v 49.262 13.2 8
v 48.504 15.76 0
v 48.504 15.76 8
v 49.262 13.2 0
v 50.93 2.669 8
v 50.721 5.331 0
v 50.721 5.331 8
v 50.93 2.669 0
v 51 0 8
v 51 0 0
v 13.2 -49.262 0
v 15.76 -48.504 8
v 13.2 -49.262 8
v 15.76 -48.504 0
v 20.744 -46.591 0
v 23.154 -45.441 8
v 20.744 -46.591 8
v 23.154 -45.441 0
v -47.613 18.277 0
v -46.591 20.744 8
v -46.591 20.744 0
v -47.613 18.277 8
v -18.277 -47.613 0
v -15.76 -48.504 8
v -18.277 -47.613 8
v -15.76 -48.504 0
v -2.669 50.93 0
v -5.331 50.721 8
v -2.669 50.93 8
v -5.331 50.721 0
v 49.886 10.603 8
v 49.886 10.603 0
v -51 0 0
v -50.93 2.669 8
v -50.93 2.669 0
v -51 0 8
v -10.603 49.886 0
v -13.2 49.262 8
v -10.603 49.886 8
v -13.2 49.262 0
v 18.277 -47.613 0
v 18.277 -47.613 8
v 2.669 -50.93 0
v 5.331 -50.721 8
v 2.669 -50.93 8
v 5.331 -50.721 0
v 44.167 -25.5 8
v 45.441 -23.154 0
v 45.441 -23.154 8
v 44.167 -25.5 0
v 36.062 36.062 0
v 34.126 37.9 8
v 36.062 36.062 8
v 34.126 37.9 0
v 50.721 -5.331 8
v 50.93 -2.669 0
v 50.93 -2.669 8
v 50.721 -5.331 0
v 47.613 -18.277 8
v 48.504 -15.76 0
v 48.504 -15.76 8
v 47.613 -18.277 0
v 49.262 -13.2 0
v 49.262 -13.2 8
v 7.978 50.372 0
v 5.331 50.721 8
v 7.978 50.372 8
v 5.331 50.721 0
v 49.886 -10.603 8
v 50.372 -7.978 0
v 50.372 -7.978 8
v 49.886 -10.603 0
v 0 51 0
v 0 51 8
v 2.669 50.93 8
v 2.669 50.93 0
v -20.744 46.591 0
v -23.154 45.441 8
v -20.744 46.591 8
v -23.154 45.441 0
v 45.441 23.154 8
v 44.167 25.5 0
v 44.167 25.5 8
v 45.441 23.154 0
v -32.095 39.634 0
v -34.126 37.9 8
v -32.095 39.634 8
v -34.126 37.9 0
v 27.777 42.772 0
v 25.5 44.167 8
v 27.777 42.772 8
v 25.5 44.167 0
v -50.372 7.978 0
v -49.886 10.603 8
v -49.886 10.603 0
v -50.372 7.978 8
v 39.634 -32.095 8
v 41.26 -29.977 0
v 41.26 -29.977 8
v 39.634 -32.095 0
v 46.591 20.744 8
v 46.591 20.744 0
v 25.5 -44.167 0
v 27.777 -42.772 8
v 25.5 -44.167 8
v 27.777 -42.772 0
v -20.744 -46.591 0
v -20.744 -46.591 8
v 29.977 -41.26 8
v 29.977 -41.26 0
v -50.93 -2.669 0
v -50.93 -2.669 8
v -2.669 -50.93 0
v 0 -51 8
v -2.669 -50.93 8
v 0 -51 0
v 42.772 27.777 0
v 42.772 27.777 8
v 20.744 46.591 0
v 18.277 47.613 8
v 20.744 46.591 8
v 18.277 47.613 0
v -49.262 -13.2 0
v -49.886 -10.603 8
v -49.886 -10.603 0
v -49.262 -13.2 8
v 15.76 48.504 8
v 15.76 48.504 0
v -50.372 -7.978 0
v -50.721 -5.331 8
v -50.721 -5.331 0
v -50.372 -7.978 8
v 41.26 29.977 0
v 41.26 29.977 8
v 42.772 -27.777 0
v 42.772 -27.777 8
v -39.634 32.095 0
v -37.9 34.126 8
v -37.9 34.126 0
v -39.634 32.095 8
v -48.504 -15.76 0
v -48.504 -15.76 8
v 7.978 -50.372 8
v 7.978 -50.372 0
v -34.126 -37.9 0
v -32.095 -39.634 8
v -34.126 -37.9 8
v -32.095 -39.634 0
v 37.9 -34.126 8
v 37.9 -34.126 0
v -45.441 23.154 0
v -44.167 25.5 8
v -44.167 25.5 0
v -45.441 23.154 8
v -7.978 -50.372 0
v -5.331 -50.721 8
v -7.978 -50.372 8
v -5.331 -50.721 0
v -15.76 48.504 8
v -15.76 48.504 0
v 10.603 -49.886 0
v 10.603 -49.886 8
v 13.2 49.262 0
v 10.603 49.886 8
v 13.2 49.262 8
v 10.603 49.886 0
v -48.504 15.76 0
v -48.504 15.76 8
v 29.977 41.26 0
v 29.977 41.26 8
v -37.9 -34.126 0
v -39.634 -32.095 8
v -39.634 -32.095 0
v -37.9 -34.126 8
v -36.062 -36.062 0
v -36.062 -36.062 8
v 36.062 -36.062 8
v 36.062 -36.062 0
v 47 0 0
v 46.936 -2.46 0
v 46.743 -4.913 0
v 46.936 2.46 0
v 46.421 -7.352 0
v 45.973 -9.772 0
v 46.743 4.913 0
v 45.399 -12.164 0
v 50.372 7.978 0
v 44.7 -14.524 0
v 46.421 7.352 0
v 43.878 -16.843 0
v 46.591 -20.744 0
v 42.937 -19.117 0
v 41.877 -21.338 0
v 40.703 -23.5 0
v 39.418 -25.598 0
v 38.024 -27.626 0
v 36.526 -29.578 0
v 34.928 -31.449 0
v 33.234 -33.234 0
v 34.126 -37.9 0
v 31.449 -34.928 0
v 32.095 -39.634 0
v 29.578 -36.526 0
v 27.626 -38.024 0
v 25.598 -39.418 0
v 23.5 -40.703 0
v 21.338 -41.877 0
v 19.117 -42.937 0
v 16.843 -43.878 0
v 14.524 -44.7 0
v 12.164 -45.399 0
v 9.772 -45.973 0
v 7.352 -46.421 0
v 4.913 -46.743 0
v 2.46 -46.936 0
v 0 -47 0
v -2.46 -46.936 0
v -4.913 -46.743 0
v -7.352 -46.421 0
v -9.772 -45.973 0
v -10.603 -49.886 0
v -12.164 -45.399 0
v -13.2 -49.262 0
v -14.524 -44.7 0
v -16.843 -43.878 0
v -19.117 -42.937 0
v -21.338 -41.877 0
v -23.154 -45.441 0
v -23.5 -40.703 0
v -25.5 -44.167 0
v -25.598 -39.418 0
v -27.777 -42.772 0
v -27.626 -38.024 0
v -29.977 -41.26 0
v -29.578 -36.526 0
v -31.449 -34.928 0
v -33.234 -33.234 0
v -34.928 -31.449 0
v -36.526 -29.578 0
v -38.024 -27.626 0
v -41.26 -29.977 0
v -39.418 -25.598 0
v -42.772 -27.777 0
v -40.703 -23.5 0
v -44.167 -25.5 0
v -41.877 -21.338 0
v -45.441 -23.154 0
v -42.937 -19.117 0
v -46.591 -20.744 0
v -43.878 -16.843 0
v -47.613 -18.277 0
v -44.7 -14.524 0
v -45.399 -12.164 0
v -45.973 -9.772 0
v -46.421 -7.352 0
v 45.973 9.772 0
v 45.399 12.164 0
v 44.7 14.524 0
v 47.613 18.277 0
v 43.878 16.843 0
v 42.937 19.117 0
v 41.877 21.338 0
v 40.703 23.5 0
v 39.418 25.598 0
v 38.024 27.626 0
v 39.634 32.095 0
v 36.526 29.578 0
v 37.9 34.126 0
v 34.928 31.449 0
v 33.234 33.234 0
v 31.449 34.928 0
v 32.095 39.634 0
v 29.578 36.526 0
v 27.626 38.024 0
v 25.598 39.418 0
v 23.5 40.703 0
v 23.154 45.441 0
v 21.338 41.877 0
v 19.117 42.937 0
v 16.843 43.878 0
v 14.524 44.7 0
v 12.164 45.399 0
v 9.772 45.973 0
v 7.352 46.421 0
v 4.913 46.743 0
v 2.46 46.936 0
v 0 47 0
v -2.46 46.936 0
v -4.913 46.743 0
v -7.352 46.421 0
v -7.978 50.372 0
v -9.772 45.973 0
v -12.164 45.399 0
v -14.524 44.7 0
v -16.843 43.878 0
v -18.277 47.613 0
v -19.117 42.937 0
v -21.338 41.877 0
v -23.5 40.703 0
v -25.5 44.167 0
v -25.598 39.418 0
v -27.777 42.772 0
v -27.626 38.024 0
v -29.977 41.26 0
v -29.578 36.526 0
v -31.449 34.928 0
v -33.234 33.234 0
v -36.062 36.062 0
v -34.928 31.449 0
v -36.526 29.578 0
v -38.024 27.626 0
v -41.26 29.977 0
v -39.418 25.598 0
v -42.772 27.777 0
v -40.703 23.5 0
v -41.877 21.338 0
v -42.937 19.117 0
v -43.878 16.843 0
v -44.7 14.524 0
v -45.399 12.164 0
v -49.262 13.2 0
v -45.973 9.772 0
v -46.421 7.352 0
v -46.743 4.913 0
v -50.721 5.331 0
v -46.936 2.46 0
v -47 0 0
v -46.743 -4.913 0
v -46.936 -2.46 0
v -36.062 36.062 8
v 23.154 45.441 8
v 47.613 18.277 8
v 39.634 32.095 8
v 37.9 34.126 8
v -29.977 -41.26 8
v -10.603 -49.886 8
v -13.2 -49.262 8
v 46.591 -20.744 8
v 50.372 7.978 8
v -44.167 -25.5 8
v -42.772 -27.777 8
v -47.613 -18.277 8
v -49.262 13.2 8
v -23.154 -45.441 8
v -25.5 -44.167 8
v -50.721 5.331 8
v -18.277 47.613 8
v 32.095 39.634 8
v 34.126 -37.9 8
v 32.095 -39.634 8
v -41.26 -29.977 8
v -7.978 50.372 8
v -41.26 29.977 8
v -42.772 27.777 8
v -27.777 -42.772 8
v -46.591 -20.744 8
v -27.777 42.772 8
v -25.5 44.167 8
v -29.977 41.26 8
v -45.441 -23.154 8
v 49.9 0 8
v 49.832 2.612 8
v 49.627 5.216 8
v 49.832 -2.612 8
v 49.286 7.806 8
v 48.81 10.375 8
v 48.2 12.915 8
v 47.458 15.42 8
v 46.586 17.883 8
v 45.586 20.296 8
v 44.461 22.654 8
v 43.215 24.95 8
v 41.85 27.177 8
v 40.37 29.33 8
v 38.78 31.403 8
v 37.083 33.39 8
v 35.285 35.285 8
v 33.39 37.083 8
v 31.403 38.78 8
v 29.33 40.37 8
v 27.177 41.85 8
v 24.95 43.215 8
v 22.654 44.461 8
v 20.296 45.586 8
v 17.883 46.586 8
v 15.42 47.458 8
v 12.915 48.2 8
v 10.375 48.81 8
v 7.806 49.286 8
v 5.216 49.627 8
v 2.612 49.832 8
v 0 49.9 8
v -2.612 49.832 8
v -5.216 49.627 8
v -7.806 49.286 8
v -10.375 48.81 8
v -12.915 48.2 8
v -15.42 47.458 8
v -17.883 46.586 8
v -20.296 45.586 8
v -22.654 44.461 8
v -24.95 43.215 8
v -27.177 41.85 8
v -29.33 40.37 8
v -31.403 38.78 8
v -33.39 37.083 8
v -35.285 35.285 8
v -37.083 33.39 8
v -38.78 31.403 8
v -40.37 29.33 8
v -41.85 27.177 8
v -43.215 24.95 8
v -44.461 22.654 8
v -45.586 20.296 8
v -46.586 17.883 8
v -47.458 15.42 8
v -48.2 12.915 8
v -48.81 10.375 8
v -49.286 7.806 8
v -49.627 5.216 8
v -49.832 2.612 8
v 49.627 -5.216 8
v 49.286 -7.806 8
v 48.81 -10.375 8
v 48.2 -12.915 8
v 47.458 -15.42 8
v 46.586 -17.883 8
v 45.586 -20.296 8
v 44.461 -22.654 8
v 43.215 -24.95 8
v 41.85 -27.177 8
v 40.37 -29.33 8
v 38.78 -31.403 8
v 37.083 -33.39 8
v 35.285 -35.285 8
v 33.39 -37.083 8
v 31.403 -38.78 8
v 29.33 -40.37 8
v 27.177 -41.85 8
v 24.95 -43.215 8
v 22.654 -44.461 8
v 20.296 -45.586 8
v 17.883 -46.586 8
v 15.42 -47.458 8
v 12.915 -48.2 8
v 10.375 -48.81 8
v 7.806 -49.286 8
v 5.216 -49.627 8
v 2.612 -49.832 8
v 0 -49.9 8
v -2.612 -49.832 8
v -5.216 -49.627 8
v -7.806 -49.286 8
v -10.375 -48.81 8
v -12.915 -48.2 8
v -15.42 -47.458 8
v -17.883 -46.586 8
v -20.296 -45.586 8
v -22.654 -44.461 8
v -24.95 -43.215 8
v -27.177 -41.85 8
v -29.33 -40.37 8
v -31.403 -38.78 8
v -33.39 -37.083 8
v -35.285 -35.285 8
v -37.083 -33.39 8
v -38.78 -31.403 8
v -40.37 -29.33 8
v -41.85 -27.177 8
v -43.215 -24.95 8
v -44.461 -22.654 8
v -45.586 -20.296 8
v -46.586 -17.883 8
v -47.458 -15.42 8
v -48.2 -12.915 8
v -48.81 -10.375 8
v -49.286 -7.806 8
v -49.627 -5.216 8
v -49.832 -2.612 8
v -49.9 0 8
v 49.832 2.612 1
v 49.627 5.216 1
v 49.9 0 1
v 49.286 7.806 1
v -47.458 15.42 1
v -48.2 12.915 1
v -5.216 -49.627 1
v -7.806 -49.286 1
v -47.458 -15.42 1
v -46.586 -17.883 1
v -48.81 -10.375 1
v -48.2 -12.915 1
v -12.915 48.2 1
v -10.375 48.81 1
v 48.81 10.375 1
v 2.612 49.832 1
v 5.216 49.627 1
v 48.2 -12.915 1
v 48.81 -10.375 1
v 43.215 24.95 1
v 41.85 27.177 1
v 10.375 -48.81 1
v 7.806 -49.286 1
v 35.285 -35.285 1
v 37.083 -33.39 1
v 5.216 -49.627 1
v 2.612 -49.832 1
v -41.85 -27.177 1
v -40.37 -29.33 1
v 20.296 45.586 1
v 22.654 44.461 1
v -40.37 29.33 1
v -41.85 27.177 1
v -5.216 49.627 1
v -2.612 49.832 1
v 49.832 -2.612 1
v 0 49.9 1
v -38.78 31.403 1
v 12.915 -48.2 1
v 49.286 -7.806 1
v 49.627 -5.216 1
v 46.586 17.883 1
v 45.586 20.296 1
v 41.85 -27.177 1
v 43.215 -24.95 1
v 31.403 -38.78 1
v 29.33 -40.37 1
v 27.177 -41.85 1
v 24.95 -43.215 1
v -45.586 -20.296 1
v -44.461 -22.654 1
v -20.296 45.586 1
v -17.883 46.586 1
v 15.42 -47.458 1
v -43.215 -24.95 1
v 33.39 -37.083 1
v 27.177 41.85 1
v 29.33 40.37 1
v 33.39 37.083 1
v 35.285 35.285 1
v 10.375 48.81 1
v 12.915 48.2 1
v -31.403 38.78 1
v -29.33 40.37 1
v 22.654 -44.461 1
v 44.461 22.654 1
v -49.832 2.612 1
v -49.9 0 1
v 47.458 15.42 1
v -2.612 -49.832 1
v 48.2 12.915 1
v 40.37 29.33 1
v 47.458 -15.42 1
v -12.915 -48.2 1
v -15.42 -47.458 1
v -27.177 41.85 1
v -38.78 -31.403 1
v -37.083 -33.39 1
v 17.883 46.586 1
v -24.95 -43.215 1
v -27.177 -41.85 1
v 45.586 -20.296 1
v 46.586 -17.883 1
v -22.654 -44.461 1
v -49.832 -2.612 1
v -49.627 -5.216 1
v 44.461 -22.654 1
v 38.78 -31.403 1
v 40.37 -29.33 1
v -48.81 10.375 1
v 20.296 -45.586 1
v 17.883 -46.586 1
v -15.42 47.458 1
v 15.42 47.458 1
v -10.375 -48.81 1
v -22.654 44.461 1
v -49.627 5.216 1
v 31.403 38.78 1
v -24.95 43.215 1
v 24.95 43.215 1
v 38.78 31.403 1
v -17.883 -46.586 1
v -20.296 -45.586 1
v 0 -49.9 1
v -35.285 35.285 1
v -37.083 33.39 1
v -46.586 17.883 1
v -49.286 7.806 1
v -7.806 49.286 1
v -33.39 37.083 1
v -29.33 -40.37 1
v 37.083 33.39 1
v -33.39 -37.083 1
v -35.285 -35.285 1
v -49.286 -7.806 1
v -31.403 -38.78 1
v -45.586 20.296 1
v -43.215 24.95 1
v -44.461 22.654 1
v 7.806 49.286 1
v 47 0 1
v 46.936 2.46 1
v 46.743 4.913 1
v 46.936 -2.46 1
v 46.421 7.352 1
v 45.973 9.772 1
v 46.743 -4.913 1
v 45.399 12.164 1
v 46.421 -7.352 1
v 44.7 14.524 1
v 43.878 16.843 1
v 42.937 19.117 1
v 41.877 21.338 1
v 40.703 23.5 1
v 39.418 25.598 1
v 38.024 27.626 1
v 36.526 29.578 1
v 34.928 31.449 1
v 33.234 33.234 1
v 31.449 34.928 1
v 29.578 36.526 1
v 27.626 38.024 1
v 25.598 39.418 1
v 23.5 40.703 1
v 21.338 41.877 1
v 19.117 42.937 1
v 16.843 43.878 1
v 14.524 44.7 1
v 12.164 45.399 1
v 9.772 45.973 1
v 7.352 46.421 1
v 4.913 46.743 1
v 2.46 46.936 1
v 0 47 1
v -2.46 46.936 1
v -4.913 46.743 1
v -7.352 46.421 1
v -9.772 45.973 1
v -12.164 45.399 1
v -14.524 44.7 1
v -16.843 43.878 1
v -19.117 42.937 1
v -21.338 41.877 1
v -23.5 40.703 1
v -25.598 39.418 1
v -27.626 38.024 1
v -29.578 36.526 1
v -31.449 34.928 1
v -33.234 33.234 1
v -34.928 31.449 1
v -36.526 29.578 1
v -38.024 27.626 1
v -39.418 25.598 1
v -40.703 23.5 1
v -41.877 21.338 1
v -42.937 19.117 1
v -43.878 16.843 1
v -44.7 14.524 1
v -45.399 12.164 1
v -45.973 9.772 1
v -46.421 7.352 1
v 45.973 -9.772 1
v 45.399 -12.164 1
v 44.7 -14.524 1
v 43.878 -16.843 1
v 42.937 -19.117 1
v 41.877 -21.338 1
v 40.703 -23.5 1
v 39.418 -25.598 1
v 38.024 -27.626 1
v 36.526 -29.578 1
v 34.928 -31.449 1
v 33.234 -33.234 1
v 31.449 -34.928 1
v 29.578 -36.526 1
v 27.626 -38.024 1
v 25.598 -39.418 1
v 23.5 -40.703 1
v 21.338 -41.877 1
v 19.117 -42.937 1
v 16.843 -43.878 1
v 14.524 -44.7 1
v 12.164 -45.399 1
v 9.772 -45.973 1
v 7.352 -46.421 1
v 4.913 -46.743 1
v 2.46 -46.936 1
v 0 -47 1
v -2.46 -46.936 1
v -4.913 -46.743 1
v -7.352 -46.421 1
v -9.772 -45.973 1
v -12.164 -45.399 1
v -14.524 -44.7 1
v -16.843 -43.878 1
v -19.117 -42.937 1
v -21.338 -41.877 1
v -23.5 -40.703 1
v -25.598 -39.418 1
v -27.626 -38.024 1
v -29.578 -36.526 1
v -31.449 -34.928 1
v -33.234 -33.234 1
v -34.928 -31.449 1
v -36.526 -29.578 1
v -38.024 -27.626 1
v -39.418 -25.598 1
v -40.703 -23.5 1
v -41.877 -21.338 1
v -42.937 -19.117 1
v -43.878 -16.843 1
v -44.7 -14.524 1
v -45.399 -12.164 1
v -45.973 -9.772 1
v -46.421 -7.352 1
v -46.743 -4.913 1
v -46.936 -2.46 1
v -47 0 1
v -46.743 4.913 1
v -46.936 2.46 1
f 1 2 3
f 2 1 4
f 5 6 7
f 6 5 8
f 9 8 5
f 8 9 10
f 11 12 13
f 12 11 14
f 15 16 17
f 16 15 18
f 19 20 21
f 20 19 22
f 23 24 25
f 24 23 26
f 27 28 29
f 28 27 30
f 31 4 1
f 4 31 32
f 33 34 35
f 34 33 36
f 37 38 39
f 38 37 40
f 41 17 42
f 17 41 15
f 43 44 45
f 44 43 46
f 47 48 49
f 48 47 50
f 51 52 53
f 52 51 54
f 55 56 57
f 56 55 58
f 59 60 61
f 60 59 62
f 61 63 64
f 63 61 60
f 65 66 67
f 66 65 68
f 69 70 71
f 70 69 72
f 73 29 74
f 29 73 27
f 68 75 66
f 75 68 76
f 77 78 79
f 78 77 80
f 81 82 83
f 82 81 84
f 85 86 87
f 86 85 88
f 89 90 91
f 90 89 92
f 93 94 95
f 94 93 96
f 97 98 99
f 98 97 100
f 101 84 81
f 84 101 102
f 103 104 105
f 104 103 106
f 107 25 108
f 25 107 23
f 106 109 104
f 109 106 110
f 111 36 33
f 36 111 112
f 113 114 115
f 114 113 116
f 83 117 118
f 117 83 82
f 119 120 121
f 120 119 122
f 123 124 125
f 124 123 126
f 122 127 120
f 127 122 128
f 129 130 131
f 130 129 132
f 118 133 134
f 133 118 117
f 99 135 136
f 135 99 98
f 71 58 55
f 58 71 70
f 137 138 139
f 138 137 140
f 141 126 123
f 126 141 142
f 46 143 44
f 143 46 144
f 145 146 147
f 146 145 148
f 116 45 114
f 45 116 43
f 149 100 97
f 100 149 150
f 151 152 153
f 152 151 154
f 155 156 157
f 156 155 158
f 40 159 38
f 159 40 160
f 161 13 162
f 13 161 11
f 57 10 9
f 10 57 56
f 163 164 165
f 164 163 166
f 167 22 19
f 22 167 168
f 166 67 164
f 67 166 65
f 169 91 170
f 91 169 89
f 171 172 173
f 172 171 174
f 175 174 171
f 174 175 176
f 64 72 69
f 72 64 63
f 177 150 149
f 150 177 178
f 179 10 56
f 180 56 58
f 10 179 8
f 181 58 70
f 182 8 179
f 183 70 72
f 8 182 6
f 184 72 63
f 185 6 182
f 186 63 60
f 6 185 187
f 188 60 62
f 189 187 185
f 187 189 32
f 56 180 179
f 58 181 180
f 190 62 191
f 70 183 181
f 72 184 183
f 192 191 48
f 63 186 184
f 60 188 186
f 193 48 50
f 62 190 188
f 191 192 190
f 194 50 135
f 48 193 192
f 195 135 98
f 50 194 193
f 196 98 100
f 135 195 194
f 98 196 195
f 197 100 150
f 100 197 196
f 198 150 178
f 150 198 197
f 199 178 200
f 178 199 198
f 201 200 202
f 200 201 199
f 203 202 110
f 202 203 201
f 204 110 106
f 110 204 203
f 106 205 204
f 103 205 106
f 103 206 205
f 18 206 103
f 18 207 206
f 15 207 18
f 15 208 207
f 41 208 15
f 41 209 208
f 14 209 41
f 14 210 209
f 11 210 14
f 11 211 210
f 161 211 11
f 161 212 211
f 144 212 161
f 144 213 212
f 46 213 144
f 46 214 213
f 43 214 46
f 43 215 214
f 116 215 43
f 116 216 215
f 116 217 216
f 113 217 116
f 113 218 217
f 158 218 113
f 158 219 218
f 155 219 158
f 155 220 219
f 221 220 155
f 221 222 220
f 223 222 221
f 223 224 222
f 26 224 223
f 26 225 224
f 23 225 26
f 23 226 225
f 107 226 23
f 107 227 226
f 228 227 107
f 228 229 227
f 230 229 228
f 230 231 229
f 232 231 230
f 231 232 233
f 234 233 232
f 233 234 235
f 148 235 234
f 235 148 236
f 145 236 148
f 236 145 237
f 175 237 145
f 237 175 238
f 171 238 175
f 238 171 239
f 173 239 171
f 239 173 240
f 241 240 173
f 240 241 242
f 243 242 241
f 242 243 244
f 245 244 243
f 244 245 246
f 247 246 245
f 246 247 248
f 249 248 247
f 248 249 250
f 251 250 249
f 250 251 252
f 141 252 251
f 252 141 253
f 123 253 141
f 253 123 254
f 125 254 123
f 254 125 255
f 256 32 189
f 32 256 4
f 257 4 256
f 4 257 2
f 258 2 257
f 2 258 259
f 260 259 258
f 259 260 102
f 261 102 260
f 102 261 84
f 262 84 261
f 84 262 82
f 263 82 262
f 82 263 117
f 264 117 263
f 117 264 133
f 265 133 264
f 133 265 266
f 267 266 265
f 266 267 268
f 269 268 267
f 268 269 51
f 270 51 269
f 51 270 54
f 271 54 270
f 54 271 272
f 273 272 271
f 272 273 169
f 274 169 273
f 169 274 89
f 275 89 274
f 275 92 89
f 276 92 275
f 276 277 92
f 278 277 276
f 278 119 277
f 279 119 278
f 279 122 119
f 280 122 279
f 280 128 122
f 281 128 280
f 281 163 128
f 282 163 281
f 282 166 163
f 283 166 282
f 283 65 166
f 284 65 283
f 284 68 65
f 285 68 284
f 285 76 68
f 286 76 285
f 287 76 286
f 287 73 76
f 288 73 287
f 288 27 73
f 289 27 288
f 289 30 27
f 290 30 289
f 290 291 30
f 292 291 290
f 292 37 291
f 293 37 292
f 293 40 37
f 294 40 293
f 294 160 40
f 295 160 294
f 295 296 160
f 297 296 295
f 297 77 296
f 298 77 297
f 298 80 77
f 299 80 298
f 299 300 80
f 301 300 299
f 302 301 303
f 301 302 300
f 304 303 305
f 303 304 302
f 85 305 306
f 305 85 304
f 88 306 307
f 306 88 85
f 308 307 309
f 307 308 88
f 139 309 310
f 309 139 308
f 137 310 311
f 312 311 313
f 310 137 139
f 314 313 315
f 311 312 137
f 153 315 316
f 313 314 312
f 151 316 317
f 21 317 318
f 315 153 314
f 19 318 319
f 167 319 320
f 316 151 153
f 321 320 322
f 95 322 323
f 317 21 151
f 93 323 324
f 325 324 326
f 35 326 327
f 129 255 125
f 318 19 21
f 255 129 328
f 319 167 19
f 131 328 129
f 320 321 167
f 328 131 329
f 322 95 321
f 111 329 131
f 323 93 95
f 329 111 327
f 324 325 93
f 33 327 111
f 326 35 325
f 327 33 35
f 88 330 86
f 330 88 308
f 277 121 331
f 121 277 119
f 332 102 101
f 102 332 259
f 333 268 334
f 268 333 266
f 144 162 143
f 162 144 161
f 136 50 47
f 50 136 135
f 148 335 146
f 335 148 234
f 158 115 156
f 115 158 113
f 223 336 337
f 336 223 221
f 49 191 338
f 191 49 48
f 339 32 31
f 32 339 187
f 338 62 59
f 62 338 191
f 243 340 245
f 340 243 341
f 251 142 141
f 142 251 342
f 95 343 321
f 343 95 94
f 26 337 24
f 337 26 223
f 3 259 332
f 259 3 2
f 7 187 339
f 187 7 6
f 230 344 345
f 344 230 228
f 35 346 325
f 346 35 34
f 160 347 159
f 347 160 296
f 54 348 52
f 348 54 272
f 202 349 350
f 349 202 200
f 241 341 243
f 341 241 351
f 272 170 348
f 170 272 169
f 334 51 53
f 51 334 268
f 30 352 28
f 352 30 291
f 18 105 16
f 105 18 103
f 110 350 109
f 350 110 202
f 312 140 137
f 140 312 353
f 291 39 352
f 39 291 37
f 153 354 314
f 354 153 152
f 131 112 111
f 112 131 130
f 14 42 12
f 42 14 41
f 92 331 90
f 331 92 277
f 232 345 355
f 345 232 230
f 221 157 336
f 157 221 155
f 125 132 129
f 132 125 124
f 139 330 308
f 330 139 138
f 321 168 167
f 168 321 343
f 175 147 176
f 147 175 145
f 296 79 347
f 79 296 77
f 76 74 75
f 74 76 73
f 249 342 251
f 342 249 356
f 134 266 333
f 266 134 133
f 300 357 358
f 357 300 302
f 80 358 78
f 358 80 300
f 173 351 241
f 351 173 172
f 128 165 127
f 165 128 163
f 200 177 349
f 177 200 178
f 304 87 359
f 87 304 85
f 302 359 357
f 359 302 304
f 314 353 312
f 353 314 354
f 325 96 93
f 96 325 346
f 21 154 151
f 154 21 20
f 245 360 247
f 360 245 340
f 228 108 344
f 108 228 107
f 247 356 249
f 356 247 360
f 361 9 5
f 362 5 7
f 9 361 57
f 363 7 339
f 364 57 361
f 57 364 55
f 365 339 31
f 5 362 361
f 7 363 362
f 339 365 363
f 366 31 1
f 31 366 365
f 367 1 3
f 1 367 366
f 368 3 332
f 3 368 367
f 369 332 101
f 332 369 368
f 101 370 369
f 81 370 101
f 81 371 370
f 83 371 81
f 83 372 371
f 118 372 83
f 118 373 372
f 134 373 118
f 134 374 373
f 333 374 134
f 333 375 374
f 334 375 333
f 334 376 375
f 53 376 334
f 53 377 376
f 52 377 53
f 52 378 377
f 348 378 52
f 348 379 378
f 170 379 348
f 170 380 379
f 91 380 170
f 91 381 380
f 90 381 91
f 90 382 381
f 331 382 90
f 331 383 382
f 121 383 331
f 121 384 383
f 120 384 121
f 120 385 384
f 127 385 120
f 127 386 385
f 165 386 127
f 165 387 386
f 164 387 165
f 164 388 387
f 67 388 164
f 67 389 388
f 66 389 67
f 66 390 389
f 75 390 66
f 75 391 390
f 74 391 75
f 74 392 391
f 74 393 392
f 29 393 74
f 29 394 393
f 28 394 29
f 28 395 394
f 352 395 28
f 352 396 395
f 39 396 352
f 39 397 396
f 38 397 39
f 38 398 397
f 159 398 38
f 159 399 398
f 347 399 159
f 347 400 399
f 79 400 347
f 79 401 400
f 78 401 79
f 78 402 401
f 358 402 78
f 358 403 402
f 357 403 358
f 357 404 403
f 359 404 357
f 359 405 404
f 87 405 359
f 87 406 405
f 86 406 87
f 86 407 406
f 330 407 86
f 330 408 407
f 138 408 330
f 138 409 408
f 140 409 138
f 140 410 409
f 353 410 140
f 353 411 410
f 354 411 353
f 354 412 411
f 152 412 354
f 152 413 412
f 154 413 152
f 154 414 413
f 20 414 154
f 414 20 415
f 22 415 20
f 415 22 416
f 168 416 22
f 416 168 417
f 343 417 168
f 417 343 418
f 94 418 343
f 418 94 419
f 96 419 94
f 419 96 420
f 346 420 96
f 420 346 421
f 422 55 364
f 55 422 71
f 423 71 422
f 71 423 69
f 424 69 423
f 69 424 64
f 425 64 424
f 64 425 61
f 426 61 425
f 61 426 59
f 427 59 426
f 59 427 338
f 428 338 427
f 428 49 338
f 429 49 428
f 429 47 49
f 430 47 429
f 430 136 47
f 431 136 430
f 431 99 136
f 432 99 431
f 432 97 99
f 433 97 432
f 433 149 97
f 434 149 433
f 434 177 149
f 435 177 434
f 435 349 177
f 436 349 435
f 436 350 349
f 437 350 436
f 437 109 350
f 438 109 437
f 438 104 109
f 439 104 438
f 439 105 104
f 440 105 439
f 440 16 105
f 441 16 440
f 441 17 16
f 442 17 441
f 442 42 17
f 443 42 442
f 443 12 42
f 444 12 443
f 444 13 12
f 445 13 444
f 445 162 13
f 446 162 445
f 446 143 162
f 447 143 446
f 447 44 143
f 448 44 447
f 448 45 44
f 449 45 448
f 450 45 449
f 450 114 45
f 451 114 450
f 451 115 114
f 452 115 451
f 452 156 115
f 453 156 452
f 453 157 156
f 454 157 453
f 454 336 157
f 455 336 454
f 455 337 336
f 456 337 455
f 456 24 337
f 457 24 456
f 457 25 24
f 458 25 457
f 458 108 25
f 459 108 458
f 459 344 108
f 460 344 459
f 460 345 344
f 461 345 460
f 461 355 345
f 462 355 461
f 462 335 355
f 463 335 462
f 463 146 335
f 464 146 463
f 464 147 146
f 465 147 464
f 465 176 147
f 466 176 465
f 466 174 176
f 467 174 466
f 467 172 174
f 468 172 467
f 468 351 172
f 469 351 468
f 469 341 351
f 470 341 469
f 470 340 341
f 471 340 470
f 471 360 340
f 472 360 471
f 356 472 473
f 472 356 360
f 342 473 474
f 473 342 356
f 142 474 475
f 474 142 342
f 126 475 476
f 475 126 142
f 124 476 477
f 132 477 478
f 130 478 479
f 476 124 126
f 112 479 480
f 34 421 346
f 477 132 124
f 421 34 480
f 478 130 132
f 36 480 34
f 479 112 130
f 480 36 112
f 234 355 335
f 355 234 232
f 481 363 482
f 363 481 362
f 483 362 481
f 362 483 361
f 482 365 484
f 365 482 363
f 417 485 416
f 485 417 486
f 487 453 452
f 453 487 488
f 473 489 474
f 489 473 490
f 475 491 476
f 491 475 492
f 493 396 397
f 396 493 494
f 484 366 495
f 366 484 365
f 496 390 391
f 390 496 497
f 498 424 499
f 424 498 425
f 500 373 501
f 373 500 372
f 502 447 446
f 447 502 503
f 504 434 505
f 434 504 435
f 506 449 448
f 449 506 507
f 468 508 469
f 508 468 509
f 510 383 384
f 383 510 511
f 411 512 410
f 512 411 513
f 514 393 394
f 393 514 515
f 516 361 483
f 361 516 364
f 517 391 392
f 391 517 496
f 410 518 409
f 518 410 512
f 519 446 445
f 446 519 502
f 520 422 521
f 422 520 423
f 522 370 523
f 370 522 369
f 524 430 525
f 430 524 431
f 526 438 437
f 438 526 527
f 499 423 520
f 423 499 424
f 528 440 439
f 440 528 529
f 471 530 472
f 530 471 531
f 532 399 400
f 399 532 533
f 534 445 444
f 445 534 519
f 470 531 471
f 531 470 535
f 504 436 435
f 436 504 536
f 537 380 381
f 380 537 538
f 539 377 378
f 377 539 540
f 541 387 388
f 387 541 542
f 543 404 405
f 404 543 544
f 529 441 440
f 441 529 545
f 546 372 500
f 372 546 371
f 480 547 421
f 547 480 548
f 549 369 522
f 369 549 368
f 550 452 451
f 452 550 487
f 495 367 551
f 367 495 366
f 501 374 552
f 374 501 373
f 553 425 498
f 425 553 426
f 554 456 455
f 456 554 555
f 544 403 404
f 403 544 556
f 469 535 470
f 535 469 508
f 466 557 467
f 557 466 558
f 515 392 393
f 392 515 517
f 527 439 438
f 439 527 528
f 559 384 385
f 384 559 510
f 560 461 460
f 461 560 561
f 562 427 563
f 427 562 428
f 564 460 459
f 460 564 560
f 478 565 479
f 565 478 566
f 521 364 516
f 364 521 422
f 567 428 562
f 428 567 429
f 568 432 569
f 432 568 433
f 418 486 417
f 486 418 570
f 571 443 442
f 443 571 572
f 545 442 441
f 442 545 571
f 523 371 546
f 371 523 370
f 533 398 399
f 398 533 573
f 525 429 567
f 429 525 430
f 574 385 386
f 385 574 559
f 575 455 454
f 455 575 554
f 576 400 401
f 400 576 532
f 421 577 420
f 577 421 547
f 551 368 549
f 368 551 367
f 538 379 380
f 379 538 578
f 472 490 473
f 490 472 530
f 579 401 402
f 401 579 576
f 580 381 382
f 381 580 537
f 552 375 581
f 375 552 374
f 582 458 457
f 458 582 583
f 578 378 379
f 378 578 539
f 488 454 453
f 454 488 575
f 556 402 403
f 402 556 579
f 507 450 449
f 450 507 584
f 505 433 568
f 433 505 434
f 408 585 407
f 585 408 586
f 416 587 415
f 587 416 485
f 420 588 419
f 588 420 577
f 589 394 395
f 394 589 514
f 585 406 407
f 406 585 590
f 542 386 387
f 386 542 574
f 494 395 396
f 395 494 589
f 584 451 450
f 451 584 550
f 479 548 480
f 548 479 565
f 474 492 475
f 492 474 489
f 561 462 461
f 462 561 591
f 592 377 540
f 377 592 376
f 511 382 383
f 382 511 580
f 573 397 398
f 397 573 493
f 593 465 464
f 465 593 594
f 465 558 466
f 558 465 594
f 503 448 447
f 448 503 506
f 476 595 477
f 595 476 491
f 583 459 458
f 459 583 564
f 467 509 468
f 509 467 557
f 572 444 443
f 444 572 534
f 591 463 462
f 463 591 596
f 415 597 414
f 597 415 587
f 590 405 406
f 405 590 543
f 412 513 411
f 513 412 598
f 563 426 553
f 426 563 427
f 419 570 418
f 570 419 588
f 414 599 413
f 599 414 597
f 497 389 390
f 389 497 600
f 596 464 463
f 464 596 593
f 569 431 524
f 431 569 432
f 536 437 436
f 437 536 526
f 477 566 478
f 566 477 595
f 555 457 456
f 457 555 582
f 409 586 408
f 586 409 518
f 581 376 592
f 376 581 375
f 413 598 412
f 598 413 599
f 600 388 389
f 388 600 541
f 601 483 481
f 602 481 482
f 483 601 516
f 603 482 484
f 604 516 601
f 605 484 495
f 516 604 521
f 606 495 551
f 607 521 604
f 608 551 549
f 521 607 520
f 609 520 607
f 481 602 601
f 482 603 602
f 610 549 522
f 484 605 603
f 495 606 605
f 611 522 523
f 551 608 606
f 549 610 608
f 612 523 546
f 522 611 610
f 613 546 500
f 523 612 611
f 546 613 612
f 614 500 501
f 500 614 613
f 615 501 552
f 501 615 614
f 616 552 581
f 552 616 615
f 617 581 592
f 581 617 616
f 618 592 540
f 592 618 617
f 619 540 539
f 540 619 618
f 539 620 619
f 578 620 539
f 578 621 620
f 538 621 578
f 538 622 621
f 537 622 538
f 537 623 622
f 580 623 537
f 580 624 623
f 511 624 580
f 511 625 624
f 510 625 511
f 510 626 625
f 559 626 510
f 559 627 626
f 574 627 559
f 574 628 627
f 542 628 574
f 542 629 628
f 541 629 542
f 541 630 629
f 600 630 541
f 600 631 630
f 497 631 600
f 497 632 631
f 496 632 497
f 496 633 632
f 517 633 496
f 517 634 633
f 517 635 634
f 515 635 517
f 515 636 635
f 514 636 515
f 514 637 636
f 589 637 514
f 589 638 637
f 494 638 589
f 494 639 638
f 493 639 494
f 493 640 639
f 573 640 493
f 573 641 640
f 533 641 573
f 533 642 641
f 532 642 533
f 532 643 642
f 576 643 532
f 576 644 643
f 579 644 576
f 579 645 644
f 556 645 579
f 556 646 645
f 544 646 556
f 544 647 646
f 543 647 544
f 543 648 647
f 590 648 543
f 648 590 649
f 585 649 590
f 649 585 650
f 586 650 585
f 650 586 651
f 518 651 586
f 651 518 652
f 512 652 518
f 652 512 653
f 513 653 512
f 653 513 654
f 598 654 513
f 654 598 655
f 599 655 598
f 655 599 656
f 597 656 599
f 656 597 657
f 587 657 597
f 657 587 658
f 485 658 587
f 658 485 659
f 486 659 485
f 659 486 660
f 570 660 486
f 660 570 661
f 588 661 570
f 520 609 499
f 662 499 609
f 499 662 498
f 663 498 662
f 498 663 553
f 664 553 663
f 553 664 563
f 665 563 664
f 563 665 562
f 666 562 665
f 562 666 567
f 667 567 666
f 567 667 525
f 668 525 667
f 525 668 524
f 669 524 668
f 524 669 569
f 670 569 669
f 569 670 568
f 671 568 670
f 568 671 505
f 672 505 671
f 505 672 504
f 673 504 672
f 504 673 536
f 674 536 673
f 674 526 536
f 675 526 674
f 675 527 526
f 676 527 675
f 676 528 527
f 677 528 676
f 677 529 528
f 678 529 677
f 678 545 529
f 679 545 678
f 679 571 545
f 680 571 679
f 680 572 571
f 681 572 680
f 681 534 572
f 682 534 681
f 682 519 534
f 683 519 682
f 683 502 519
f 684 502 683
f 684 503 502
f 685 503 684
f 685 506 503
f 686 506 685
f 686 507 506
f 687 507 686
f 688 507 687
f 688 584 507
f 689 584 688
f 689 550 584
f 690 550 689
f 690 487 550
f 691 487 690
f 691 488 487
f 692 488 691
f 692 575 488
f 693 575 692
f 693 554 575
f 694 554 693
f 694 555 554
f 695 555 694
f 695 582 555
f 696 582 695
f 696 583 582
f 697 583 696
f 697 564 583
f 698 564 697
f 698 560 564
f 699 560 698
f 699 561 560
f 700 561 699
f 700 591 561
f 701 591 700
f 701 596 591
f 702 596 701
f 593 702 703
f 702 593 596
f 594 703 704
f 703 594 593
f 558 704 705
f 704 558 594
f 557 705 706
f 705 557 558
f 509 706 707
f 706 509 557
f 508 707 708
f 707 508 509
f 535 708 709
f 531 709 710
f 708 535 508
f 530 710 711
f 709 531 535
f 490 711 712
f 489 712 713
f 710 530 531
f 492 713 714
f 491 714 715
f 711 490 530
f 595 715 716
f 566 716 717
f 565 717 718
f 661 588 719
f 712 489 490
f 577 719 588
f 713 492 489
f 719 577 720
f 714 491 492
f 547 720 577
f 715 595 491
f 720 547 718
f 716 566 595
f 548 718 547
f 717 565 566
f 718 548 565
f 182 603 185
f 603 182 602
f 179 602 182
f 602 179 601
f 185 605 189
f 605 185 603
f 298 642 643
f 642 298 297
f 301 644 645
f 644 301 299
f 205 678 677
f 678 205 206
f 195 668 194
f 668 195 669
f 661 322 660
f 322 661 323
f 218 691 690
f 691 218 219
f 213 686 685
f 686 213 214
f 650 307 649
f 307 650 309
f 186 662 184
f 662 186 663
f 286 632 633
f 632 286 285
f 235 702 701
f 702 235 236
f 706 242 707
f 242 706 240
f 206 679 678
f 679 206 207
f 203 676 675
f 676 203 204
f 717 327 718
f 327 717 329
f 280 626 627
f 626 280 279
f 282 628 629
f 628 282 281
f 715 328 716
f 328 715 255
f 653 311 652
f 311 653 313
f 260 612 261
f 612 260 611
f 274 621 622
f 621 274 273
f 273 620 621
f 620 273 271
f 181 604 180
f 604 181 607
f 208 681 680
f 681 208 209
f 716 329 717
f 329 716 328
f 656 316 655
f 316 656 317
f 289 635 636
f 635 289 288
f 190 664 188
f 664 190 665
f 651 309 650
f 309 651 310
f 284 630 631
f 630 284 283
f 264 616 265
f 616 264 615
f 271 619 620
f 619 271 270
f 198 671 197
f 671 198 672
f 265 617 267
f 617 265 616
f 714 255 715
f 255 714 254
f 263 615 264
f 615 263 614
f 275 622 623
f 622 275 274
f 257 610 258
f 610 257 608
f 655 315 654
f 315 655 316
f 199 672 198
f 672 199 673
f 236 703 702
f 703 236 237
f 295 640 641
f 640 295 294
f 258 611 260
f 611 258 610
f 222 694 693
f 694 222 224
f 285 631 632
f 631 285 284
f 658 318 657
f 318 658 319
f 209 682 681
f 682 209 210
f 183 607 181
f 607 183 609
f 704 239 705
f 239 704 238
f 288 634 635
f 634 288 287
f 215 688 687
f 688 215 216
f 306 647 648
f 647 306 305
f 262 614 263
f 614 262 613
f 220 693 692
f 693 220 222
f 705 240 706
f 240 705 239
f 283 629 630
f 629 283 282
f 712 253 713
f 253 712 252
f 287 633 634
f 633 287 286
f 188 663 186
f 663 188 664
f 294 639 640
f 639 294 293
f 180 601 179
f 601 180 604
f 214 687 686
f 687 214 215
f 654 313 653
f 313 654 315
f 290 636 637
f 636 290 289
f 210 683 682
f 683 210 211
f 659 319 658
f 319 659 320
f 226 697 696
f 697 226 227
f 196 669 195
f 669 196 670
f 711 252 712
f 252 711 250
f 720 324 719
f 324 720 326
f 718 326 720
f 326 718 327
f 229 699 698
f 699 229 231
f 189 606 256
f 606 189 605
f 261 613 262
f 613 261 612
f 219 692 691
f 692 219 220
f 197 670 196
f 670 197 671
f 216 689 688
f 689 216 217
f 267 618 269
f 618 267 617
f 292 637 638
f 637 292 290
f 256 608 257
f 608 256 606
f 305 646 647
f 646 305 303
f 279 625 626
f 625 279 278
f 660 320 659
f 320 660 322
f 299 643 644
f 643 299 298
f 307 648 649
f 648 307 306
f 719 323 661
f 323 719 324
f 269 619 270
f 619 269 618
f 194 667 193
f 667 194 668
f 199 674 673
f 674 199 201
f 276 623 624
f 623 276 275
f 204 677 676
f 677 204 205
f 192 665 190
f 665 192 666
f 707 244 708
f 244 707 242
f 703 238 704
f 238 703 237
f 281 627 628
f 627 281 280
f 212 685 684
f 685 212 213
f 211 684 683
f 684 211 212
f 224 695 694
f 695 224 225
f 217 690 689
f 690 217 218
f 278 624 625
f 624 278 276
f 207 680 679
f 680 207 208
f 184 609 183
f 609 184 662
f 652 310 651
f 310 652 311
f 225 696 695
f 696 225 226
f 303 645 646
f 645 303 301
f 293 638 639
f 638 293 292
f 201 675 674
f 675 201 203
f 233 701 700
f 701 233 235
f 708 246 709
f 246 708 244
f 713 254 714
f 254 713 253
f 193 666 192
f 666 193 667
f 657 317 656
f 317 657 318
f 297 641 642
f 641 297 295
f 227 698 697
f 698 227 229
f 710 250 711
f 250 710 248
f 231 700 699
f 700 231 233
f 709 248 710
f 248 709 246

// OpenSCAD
$fa=3;
inner_r=40;
outer_r=50;
topper_height=6;
mini=1;
drink_hole_dim = [15, 5, 7];
air_hole_dim = [5, 5, 7];
outer_dist=6;
debug_shift = 0.5;

* topper();
* rotate(90, [0, 0, 1])
	translate([0,0,topper_height])
		top();
translate([0, 0, topper_height + 2 * mini]) mirror([0, 0, 1])
	ring();


module topper() {
	difference() {
		cylinder(r=outer_r, h=topper_height);
		translate([0, 0, -debug_shift])
			cylinder(r=inner_r, h=topper_height - 2 + 2 * debug_shift, center=false);
		translate([0, 0, topper_height - 2])
			cylinder(r1=inner_r, r2=inner_r + 1 + debug_shift, h=1 + debug_shift);
		translate([0, 0, topper_height - 1])
			cylinder(r1=inner_r + 1, r2=inner_r + 4 + debug_shift, h=1 + debug_shift);
	}
}

module top() {
	difference() {
		union() {
			cylinder(r=outer_r, h=mini);
			translate([-drink_hole_dim.x/2, outer_r - drink_hole_dim.y - outer_dist, 0])
				cube(drink_hole_dim);		
			translate([-air_hole_dim.x/2, - outer_r + air_hole_dim.y + outer_dist, 0])
				cube(air_hole_dim);		
		}
		translate([-drink_hole_dim.x/2, outer_r - drink_hole_dim.y - outer_dist, 0])
			translate([mini, mini, -debug_shift])
				cube([drink_hole_dim.x - 2*mini, drink_hole_dim.y - 2 * mini, drink_hole_dim.z + 2 * debug_shift]);
		translate([-air_hole_dim.x/2, - outer_r + air_hole_dim.y + outer_dist, 0])
			translate([mini, mini, -debug_shift])
				cube([air_hole_dim.x - 2*mini, air_hole_dim.y - 2 * mini, air_hole_dim.z + 2 * debug_shift]);		
	}
	scale([0.4, 0.4, 1])
		rotate(180, [0, 0, 1]) translate([-76, -76, mini]) 
			linear_extrude(height=mini, convexity=10)
				import(file="smiley.dxf", layer="smiley");
}

module ring() {
	difference() {
		cylinder(r=outer_r + mini, h=topper_height + 2 * mini);
		translate([0,0,-debug_shift])
			cylinder(r=outer_r - 0.1,  h=topper_height + mini + debug_shift);
		cylinder(r=outer_r - 3,    h=topper_height + 2 * mini + debug_shift);
	}	
}
